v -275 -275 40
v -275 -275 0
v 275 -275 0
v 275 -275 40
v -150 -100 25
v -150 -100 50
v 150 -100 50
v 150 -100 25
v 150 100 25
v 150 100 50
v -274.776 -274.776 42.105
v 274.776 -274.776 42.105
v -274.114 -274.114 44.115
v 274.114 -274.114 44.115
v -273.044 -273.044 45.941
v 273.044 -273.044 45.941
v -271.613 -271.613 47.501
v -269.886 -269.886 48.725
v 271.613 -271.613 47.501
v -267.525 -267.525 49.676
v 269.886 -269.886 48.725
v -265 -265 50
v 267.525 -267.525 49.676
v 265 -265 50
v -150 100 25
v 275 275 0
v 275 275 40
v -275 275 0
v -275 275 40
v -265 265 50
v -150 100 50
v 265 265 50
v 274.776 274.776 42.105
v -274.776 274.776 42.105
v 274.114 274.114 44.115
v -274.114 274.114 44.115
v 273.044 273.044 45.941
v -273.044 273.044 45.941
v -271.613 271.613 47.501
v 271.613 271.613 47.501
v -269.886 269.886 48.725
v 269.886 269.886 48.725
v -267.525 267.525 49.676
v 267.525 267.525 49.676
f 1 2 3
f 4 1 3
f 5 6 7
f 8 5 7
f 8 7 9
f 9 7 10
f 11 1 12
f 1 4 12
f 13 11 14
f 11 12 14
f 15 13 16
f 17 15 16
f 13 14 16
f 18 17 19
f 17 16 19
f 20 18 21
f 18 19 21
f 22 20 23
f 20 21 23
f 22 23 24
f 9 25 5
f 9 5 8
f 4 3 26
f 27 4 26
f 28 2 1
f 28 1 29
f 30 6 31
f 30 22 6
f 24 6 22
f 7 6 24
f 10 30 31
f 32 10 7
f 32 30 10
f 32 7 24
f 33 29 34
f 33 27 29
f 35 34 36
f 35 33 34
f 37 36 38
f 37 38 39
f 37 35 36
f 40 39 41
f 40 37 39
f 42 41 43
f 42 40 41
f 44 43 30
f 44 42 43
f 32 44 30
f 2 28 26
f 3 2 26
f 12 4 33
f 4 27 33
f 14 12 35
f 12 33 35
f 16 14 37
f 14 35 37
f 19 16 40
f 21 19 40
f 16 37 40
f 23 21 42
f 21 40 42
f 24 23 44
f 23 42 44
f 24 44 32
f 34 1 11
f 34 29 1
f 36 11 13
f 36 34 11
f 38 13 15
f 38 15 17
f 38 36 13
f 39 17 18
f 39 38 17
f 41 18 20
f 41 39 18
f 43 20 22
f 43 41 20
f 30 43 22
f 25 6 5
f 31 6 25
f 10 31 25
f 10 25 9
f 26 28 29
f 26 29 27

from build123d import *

# Parameters (mm, degrees)
F0_W     = 550
F0_H     = 550
F1_DEPTH = 50
F2_R     = 10
F3_W     = 300
F3_H     = 200
F4_DEPTH = 25
F5_DEPTH = 25


with BuildPart() as f1:
    # F0 (on Top) → F1 (new body)
    with BuildSketch(Plane.XY):
        Rectangle(F0_W, F0_H)
    extrude(amount=F1_DEPTH)

    # F2
    f2_edges = [f1.edges().sort_by_distance(p)[0] for p in [
        (-275, 0, 50),
        (0, 275, 50),
        (275, 0, 50),
        (0, -275, 50),
    ]]
    fillet(f2_edges, radius=F2_R)

    # F3 (on face) → F4 (join)
    with BuildSketch(Plane.XY.offset(50)):
        Rectangle(F3_W, F3_H)
    extrude(amount=-F4_DEPTH)

    # F3 (on face) → F5 (cut)
    with BuildSketch(Plane.XY.offset(50)):
        Rectangle(F3_W, F3_H)
    extrude(amount=-F5_DEPTH, mode=Mode.SUBTRACT)


solid = f1.part
